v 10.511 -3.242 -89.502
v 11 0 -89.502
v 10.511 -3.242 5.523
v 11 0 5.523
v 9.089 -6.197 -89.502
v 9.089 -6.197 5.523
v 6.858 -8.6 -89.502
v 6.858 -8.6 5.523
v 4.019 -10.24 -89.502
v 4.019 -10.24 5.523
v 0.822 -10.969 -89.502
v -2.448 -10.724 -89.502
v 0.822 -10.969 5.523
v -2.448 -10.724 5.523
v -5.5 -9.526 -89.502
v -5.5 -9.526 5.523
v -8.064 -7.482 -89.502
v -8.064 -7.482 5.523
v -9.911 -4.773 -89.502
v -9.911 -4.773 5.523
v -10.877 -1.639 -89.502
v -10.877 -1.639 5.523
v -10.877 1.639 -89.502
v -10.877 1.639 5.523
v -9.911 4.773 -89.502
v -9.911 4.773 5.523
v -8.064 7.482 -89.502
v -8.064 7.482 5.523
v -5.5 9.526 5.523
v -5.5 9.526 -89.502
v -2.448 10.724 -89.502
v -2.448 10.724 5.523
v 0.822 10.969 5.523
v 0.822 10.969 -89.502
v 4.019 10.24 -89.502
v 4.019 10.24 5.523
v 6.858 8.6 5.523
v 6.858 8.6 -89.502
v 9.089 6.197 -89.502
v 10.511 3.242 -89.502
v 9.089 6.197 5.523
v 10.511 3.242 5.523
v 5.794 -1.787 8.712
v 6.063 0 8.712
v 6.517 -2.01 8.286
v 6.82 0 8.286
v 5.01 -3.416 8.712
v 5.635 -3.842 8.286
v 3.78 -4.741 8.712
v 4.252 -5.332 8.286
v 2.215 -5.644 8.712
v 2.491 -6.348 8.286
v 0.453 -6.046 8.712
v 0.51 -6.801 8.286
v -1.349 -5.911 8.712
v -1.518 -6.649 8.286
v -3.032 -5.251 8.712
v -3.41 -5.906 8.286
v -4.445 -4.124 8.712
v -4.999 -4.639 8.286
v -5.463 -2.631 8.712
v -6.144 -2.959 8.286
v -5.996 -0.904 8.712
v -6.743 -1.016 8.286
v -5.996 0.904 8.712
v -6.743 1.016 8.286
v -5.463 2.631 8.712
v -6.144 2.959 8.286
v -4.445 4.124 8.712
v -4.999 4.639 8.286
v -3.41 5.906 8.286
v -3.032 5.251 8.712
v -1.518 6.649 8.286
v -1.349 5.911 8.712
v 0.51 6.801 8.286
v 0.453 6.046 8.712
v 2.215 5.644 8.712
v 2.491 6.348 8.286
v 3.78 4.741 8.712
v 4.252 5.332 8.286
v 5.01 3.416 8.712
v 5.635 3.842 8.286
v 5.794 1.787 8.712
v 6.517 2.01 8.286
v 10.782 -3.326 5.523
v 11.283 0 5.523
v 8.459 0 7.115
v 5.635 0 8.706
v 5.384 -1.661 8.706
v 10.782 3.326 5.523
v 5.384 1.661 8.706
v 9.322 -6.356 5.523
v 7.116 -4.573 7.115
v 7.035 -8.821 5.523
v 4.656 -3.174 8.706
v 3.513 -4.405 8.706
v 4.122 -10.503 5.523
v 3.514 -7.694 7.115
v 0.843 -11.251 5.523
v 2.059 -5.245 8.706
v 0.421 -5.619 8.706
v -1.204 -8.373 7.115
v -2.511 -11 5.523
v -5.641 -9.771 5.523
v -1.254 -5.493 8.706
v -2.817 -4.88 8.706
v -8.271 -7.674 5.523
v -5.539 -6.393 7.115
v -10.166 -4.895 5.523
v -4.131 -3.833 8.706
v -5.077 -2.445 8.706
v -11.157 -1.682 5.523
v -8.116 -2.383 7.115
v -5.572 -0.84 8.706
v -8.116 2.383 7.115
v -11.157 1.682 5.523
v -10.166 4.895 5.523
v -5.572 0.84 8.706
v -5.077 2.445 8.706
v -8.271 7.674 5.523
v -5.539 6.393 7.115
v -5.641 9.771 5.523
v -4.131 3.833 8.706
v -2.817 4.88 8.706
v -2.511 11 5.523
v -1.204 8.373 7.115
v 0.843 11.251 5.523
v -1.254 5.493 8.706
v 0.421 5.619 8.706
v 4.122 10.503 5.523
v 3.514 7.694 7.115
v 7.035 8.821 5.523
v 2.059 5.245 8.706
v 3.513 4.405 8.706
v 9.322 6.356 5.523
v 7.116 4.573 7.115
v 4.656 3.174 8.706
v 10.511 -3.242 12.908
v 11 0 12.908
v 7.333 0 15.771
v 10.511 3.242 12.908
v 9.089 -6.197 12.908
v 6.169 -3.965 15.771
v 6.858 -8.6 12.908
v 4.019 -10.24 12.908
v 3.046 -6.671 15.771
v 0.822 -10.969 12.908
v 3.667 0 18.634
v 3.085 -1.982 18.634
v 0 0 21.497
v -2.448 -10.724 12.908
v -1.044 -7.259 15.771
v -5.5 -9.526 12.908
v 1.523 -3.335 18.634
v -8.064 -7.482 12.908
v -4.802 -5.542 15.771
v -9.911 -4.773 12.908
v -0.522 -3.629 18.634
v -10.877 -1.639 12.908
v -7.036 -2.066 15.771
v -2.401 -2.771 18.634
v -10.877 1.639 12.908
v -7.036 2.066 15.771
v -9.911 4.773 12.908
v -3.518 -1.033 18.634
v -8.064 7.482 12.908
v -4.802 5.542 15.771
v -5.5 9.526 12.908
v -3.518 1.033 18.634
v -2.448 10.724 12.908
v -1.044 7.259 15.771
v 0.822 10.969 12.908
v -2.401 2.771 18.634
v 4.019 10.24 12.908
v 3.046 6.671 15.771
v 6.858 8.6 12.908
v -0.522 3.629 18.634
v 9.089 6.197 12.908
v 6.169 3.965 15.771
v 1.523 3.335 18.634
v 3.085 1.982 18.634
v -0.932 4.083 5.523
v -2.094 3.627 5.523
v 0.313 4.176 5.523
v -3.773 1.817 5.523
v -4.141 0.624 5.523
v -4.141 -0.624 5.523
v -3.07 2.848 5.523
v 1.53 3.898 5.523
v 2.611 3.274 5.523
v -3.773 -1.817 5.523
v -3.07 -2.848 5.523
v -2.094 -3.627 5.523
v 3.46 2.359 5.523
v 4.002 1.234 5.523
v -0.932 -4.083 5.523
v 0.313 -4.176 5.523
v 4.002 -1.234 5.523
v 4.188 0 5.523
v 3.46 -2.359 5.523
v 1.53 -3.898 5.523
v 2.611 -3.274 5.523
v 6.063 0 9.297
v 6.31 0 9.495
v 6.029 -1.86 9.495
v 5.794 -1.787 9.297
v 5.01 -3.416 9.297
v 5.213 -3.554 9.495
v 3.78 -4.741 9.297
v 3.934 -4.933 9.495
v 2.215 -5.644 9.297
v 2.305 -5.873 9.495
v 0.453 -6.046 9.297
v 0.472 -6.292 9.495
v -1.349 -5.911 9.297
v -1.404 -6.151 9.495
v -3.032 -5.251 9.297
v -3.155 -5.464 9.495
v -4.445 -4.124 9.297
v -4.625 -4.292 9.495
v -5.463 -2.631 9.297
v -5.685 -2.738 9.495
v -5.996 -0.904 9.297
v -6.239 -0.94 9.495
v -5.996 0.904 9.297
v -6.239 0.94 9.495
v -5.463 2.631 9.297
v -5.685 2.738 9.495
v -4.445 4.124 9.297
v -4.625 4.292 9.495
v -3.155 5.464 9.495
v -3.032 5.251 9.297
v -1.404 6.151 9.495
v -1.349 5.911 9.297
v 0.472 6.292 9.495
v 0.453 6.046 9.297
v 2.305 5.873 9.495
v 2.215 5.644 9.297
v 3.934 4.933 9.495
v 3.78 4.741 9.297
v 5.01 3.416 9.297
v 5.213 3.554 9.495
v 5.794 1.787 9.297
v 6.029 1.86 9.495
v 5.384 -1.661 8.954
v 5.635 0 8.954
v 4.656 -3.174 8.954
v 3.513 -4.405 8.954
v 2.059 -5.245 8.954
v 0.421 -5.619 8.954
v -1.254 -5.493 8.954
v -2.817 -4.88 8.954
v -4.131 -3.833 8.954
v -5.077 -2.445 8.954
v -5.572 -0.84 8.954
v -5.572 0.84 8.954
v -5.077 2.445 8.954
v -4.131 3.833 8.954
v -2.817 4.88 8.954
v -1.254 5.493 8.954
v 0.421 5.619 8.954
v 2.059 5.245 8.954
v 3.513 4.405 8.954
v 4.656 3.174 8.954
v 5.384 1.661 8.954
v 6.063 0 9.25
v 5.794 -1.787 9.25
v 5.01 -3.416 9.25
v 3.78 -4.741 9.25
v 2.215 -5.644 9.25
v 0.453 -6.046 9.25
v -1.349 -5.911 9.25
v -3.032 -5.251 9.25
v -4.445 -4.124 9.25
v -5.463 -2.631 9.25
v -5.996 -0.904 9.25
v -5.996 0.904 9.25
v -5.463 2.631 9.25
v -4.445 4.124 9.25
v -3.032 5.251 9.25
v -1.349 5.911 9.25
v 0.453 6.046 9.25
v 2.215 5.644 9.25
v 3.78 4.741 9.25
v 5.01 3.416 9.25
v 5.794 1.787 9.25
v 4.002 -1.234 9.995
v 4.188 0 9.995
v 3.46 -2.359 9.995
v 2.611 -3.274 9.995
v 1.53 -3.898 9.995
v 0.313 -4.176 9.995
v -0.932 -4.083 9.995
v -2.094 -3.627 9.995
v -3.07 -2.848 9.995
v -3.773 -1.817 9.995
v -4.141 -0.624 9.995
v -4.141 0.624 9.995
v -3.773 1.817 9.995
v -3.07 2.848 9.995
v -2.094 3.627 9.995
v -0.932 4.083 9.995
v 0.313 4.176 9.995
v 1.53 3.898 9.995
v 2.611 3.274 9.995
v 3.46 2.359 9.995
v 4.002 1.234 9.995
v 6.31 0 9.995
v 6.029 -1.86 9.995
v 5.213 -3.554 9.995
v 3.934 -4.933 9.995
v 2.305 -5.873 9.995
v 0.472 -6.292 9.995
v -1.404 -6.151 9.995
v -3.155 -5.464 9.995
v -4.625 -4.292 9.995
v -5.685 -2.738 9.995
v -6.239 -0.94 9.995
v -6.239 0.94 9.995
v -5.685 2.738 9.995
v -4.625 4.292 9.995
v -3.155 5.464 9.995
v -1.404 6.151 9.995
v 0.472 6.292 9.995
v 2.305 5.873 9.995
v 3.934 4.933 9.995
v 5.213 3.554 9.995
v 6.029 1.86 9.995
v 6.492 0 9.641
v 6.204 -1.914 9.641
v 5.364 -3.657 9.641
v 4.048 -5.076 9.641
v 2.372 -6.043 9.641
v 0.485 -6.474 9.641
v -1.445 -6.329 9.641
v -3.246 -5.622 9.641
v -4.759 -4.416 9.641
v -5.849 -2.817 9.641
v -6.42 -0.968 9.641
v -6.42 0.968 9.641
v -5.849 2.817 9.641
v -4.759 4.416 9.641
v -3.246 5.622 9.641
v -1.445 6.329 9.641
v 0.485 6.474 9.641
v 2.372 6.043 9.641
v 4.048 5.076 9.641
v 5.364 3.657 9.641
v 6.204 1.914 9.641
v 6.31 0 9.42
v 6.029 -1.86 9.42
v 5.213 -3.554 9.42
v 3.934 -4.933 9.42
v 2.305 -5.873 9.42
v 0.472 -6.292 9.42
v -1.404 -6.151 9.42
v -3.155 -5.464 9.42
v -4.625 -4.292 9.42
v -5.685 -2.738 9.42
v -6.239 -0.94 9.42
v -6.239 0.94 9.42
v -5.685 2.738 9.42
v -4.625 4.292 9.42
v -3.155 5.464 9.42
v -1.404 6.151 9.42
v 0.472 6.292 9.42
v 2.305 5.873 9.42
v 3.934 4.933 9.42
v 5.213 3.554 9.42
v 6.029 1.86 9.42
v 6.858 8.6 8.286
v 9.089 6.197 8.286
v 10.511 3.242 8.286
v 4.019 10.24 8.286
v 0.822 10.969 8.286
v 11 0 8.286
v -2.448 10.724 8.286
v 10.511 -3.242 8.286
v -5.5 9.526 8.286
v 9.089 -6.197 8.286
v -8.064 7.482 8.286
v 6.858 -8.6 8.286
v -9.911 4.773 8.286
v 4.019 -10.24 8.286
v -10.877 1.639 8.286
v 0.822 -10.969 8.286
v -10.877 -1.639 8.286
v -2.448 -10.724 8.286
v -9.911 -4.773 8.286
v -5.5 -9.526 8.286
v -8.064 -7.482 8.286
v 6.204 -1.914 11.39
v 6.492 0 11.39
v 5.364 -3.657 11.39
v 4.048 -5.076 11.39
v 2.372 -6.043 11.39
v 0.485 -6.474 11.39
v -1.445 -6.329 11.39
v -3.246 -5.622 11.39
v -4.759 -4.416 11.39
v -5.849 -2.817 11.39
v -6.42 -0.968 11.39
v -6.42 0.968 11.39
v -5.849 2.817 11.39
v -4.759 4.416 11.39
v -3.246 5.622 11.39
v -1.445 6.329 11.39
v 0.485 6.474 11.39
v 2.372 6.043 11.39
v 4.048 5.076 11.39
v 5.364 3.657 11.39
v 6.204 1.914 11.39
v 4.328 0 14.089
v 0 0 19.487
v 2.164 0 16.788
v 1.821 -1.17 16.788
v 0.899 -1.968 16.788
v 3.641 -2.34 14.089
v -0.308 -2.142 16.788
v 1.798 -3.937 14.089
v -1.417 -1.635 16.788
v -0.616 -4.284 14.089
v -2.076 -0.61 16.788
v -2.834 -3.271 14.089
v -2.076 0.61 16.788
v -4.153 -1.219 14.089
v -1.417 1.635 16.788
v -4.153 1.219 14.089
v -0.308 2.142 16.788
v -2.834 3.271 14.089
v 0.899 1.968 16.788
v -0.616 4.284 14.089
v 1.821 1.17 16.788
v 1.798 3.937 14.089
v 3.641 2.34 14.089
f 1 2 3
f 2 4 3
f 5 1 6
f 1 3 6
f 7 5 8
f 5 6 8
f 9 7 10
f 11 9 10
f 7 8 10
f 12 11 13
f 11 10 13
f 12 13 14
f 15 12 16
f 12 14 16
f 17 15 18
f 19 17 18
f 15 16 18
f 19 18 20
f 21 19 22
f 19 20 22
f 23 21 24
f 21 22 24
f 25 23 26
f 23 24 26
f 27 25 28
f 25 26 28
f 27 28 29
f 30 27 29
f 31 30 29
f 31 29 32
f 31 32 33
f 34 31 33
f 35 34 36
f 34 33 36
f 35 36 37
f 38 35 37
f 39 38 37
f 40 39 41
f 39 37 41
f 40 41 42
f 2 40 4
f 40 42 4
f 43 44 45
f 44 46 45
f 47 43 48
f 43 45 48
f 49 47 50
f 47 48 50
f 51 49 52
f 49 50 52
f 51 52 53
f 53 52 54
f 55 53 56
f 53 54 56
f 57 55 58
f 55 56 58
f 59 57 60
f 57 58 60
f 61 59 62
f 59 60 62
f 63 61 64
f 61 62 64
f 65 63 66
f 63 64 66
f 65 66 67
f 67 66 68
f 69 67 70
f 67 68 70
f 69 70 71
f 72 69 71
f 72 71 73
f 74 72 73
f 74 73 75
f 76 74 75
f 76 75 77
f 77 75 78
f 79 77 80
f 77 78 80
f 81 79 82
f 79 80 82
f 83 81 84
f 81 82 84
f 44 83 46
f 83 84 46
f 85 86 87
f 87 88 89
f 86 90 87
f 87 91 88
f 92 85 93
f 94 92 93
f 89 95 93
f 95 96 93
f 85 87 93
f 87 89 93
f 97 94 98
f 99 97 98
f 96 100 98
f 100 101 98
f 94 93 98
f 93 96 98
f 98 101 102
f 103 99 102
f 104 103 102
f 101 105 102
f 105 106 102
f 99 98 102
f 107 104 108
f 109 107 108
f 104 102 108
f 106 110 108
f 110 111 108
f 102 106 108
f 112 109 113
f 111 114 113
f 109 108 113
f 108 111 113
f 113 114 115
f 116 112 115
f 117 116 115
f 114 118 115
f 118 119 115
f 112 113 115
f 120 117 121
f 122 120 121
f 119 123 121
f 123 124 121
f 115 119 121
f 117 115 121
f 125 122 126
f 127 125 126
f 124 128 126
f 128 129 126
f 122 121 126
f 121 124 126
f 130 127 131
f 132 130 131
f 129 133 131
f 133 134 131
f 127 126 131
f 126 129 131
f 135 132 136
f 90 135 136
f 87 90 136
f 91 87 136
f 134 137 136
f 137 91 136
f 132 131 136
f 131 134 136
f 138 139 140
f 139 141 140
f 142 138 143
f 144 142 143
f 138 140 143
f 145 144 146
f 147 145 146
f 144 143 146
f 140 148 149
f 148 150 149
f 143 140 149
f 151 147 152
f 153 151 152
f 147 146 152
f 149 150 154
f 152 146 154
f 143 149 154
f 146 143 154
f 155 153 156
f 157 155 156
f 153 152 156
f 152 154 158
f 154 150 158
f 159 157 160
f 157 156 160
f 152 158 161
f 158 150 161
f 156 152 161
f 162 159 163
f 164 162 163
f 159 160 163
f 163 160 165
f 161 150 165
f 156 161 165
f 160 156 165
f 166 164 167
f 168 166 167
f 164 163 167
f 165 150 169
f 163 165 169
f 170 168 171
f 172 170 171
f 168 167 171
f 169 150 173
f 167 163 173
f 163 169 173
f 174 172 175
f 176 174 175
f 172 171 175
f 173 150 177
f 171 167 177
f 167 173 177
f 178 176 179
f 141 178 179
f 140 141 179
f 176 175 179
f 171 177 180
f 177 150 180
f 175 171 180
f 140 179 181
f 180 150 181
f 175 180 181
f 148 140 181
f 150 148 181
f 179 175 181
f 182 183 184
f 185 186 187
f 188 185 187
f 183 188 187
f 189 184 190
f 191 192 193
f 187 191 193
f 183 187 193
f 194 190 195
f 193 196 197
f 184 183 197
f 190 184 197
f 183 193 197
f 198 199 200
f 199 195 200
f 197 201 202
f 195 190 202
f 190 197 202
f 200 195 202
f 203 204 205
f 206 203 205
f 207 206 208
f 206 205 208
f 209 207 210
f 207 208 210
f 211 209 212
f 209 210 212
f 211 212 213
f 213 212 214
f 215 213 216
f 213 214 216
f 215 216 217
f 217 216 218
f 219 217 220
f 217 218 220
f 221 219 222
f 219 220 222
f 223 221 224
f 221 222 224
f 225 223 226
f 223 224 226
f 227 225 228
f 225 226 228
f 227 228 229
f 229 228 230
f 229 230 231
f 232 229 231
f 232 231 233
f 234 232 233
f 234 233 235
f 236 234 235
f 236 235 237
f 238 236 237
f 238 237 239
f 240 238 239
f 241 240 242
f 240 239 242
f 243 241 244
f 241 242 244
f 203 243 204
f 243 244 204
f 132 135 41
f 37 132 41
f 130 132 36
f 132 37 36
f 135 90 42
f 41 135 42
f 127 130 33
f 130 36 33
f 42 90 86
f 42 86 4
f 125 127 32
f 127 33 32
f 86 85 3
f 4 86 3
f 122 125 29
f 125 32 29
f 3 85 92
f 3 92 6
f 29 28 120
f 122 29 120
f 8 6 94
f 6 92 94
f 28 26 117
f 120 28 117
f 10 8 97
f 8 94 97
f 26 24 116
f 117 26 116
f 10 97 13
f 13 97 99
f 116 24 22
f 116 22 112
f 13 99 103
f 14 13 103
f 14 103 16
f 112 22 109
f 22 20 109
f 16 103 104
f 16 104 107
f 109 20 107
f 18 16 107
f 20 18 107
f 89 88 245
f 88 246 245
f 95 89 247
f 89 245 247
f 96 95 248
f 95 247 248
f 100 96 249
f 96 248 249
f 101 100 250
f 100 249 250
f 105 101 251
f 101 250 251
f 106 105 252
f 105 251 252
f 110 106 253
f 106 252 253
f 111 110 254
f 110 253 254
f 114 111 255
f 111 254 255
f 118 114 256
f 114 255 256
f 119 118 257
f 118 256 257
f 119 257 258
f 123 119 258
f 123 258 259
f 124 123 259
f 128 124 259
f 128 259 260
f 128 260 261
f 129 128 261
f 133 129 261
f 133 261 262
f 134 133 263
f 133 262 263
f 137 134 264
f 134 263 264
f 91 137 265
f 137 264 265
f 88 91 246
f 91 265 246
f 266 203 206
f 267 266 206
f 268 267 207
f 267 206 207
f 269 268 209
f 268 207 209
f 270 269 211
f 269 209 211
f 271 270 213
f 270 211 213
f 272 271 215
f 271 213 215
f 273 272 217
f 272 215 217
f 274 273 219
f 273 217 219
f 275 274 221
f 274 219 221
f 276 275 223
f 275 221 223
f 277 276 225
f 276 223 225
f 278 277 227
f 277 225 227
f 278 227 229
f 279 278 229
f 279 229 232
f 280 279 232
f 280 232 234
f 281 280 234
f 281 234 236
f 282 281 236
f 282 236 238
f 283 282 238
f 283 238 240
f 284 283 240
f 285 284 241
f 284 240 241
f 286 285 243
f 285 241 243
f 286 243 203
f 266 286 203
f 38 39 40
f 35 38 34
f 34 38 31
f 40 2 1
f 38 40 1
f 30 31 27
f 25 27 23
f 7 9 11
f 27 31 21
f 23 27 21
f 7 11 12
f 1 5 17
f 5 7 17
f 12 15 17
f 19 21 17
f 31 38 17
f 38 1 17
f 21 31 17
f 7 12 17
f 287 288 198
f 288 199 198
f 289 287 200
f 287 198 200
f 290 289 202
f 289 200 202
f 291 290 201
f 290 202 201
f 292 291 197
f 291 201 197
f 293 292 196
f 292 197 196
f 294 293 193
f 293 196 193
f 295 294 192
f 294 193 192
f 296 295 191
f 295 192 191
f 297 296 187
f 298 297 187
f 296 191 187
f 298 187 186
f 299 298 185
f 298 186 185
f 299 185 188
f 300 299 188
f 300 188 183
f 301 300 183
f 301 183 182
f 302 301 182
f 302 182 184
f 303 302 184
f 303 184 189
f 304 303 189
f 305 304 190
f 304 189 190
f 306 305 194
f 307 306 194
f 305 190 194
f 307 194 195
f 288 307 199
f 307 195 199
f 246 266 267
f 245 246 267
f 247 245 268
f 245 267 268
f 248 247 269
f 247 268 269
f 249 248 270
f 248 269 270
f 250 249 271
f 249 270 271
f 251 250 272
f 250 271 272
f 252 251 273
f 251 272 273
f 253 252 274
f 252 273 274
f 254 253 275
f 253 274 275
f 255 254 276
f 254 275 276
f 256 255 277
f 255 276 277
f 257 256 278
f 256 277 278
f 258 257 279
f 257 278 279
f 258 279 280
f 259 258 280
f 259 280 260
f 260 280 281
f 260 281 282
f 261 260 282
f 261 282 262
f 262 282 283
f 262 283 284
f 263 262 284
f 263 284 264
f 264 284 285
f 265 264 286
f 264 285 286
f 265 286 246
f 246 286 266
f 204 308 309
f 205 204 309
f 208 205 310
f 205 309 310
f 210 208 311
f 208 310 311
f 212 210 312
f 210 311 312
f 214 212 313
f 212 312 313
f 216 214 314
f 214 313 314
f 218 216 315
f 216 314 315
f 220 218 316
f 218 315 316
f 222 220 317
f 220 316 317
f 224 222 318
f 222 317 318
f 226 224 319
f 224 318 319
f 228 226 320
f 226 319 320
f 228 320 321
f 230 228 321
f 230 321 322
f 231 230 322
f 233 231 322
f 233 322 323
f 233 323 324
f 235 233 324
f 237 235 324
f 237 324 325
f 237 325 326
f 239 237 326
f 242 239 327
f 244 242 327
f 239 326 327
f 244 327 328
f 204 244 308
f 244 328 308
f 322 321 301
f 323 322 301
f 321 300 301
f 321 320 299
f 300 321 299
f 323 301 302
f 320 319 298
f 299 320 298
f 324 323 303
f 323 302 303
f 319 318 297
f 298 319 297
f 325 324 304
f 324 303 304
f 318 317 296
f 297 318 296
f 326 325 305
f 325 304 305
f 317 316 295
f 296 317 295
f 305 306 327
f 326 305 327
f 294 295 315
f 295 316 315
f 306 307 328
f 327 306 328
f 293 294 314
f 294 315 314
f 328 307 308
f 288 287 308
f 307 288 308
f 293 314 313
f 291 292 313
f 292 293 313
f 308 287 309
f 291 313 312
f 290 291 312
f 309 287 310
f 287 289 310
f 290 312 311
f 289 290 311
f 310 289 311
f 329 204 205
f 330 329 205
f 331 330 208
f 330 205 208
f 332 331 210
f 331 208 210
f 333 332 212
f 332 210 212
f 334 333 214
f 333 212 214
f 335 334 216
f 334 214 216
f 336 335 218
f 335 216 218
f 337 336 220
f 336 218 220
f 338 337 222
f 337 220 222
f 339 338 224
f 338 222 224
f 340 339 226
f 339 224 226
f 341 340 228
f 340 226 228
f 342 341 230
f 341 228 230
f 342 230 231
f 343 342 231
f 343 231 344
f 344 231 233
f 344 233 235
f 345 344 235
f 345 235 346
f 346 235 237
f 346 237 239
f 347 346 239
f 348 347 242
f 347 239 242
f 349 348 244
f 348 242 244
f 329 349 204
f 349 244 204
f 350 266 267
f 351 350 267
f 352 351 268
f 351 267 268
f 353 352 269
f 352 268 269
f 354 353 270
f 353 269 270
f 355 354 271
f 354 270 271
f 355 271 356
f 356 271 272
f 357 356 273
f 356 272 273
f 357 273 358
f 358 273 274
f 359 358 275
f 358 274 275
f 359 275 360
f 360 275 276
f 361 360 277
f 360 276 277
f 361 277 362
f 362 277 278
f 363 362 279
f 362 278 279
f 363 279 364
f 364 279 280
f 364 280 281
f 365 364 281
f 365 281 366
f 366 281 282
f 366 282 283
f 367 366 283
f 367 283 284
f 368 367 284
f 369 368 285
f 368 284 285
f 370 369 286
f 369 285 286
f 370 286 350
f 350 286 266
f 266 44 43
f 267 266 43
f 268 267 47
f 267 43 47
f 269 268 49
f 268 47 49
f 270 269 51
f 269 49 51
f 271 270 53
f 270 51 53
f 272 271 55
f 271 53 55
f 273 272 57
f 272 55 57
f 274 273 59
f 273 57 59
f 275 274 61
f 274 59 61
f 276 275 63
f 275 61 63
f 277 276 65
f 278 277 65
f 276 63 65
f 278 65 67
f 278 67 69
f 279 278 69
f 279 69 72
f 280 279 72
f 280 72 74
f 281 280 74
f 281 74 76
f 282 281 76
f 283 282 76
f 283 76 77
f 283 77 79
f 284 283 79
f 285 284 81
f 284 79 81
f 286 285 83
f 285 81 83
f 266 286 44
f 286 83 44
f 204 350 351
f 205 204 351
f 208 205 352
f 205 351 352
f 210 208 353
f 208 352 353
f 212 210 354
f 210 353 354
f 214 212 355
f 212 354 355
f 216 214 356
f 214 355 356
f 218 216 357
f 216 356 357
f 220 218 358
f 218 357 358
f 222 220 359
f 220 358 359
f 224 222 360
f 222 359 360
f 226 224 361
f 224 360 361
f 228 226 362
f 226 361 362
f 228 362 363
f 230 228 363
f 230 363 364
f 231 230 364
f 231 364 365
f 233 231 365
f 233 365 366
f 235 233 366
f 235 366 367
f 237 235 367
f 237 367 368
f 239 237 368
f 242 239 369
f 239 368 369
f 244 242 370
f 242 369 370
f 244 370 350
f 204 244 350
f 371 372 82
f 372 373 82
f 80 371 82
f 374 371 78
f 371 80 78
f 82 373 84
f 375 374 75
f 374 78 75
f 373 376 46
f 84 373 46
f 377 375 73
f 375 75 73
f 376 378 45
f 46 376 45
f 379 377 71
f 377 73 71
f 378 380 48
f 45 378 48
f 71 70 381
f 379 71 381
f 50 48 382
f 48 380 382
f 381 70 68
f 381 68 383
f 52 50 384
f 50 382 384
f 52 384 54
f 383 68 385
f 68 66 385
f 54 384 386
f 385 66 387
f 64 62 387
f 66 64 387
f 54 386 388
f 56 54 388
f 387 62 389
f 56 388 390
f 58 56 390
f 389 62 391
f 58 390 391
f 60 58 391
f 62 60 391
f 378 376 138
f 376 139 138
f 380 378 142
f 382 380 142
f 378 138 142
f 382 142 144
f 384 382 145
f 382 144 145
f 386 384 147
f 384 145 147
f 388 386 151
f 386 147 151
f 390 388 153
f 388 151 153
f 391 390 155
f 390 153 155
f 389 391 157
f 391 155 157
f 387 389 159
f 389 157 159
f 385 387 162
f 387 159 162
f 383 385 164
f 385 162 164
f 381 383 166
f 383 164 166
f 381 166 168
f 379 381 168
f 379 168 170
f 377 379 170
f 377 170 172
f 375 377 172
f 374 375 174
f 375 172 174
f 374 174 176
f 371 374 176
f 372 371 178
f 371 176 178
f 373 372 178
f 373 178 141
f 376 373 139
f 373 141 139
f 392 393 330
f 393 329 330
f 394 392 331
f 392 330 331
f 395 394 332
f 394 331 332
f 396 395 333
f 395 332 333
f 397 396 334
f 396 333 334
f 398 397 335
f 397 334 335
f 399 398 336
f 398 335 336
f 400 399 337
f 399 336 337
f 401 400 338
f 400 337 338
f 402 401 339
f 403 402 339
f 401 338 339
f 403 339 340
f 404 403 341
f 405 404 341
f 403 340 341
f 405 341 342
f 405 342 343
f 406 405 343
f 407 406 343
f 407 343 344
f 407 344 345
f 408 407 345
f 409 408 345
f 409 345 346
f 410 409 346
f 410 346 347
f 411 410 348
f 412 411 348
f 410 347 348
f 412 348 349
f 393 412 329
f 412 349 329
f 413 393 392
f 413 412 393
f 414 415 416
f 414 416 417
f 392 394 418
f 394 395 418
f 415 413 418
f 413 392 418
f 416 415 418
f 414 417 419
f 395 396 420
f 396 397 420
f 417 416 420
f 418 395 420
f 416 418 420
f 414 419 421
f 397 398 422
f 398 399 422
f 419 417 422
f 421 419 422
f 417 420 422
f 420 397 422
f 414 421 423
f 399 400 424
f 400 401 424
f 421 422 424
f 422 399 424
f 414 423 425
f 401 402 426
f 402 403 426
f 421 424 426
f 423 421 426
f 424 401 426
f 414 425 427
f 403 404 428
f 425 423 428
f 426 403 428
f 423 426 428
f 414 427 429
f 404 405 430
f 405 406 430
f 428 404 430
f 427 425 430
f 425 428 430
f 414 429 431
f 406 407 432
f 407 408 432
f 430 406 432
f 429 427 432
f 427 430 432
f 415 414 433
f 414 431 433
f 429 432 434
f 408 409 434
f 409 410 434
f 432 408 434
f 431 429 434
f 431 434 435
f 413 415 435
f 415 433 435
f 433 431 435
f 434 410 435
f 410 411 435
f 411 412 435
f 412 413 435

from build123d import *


with BuildPart() as f1:
    # F0 (on Front) → F1 (revolve)
    with BuildSketch(Plane.XZ):
        Polygon((4.187817, 5.523331), (0, 5.523331), (0, -28.086297), (0, -89.502007), (11, -89.502007), (11, 5.523331), (11.282928, 5.523331), (5.634693, 8.706216), (5.634693, 8.953586), (6.063399, 9.249599), (6.063399, 9.297321), (6.309645, 9.494761), (6.309645, 9.994924), (4.187817, 9.994924), align=None)
        Polygon((11, 12.908013), (0, 21.497463), (0, 19.48731), (6.492104, 11.390365), (6.492104, 9.641056), (6.309645, 9.494761), (6.309645, 9.419627), (6.063399, 9.249599), (6.063399, 8.712003), (6.819631, 8.285852), (11, 8.285852), align=None)
    revolve(axis=Axis((0, 0, -0.502539), (0, 0, -1)))


solid = f1.part
